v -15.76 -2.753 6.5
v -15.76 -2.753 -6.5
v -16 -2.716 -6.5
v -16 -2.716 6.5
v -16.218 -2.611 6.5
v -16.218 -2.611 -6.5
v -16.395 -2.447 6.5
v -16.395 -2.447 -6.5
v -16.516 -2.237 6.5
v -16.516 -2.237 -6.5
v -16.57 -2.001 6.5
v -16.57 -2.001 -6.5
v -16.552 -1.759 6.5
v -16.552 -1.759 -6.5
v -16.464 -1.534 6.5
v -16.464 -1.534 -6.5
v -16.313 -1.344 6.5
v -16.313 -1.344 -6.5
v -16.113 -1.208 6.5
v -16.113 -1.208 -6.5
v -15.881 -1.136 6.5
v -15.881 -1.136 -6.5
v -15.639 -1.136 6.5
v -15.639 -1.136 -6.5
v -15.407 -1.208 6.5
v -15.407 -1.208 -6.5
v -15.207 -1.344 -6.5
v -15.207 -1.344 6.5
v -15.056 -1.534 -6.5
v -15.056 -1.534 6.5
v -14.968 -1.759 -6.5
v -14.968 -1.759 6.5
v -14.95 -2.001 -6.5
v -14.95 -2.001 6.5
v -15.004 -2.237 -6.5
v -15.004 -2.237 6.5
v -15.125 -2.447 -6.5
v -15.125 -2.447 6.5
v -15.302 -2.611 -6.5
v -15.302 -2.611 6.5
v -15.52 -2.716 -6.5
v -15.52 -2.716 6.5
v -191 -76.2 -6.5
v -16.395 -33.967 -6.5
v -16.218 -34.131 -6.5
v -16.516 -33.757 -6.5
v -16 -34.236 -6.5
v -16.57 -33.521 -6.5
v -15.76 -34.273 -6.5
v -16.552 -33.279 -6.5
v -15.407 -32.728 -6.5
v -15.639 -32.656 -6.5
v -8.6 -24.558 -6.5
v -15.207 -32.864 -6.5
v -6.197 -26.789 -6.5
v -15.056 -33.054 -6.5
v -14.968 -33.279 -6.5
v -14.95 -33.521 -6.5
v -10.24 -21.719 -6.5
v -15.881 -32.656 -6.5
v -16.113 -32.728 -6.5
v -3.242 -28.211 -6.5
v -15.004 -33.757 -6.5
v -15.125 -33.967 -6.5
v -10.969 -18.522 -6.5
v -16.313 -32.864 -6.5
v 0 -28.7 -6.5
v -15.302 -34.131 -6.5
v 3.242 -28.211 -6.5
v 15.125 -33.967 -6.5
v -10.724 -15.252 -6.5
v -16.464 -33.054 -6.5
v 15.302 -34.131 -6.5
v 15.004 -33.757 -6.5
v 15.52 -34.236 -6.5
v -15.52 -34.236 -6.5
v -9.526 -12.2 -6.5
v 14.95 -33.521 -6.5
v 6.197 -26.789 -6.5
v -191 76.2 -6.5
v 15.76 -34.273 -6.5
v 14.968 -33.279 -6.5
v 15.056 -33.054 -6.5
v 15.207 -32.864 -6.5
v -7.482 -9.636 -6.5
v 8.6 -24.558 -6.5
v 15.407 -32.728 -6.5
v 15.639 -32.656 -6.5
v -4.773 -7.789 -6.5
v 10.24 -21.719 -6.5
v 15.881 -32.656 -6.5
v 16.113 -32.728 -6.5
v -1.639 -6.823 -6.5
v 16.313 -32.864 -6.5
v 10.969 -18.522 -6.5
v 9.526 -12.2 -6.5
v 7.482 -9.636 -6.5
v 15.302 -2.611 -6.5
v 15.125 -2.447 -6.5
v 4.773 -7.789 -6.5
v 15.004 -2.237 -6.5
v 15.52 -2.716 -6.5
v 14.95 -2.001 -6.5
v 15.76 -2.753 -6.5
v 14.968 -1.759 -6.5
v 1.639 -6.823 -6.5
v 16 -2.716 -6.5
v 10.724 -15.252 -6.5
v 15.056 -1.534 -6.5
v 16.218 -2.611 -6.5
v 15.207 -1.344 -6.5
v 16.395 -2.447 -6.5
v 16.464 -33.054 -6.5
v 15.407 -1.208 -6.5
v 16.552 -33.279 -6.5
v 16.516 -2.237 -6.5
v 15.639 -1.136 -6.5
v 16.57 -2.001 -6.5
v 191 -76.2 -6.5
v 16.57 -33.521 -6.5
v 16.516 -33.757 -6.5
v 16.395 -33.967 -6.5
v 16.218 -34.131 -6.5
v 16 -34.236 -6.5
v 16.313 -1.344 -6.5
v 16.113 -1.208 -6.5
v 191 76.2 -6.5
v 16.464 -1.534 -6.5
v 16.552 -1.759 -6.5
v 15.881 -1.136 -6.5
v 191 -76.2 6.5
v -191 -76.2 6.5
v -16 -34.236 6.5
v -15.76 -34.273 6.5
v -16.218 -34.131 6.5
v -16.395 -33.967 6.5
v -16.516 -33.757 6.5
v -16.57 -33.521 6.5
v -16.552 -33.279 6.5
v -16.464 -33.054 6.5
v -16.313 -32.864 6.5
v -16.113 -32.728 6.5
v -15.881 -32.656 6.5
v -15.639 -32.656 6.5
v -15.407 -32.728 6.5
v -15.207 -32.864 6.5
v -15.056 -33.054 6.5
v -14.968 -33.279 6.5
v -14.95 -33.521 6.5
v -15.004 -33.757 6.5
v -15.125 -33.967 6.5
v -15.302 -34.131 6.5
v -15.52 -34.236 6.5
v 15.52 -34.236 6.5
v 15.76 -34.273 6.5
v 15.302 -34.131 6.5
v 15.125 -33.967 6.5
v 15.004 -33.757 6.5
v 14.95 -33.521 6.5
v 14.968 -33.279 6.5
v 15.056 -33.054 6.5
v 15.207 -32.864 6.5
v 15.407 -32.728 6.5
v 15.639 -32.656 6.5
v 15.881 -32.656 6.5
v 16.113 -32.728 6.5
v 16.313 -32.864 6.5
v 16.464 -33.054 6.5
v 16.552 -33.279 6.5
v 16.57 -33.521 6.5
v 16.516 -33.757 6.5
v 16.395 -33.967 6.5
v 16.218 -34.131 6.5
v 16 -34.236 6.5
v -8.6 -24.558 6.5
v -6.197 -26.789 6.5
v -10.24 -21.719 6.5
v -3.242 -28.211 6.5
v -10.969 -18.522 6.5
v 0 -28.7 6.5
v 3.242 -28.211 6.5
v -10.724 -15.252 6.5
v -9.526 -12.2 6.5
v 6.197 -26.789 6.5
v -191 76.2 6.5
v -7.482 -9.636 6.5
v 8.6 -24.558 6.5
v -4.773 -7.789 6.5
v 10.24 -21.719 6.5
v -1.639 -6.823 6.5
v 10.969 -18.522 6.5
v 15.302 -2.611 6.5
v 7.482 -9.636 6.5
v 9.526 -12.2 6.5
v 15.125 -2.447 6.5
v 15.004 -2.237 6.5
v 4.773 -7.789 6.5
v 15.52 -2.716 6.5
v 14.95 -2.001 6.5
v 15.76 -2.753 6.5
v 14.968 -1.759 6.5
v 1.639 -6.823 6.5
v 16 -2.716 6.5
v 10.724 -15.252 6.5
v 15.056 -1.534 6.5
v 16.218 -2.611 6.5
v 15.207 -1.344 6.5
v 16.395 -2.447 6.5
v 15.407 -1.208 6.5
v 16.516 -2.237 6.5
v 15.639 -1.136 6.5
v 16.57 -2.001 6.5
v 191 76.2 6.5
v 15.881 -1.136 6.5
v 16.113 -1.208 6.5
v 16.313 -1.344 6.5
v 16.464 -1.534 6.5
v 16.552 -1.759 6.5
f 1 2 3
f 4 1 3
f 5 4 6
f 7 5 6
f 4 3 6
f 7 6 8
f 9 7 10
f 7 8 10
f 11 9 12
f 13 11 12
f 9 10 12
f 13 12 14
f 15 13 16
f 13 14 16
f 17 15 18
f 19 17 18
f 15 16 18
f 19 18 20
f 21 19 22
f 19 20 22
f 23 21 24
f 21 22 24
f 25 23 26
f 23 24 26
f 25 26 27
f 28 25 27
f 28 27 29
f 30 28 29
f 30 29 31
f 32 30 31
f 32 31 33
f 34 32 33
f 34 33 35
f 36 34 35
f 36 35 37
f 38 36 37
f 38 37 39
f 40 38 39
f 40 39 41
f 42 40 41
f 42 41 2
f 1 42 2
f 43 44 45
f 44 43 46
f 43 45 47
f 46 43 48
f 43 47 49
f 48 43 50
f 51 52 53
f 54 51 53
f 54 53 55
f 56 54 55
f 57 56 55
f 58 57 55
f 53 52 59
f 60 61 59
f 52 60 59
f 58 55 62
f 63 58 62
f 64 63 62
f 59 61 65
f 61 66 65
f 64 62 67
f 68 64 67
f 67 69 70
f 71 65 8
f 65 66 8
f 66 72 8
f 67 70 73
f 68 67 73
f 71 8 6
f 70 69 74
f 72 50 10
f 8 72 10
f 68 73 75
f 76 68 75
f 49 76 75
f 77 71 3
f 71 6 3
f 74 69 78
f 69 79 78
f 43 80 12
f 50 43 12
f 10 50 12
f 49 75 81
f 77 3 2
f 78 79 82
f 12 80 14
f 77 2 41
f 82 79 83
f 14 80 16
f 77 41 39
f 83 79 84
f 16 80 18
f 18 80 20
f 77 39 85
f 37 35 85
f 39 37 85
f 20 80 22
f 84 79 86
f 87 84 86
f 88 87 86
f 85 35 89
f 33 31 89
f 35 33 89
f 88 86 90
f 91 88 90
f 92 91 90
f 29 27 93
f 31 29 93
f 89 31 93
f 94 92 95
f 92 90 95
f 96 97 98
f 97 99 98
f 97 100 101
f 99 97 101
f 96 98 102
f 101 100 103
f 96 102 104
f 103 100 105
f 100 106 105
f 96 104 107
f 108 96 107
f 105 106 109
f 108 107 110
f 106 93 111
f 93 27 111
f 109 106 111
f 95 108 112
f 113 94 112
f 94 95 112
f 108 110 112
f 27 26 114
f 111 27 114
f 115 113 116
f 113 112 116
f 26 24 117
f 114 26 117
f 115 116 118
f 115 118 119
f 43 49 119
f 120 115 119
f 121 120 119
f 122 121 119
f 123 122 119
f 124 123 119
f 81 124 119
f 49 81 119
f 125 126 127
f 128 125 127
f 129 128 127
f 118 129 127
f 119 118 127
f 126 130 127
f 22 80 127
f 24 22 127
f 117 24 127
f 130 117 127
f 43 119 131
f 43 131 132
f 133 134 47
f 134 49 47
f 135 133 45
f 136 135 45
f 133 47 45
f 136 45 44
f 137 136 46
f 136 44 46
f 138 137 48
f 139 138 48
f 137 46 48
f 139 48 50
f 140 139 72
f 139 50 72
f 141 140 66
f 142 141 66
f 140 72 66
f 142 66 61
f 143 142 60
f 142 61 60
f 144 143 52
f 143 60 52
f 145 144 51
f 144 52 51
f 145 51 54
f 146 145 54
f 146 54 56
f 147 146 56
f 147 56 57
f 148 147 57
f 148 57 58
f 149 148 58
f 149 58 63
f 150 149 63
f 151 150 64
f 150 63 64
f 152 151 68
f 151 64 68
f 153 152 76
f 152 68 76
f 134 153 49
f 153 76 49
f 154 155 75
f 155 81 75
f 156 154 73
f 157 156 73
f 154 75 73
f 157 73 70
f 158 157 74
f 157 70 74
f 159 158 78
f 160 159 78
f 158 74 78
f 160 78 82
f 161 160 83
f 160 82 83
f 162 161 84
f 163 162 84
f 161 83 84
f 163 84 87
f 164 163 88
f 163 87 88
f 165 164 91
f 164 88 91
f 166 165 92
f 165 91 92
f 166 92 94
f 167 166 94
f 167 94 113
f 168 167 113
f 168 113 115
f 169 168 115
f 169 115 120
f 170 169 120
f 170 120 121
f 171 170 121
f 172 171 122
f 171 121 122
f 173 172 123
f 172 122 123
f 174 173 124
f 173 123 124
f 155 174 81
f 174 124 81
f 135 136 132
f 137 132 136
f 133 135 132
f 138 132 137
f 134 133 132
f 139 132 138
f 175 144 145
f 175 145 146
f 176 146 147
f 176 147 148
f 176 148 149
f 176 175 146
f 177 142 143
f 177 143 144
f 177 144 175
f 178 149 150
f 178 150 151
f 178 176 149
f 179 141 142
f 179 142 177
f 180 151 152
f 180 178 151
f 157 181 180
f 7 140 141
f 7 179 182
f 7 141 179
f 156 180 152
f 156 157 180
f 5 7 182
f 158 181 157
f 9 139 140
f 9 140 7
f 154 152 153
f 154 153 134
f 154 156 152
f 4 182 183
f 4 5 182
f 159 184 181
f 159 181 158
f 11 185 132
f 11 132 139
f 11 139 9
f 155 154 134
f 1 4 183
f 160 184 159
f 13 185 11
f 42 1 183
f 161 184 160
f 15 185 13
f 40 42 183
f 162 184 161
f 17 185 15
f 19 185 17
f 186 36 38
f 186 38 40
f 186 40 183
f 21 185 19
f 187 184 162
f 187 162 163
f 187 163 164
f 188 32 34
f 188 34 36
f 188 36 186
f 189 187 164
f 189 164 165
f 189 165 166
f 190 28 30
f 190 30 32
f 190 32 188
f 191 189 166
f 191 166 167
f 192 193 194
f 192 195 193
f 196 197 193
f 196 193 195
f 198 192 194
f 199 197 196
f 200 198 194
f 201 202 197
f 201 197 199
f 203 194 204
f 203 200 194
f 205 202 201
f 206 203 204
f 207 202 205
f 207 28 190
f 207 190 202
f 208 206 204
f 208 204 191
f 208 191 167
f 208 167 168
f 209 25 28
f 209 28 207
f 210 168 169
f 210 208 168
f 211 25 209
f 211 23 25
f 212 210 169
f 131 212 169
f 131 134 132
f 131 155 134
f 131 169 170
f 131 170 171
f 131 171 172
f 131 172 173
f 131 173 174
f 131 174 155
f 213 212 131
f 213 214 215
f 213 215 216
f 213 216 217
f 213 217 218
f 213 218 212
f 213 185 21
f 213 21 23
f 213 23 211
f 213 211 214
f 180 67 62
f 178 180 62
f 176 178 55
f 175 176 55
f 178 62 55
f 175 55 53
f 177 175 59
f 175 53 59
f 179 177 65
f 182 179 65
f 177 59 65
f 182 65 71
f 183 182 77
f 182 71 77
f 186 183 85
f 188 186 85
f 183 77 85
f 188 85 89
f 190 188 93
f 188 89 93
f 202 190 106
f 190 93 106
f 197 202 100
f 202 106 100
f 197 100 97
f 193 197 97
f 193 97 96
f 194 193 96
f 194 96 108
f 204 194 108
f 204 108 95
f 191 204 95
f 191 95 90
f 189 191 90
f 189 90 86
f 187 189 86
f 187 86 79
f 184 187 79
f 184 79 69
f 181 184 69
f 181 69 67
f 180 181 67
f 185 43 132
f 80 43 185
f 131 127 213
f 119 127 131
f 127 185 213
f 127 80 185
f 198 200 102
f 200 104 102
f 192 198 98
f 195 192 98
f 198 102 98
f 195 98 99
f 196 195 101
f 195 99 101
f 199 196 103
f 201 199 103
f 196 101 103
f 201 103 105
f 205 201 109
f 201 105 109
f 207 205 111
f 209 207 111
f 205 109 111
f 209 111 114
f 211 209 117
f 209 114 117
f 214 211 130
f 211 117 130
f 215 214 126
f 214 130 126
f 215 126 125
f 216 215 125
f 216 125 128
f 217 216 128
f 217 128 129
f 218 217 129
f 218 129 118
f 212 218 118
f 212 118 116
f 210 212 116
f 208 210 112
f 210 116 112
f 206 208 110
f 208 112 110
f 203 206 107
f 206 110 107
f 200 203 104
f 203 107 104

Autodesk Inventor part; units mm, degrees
ref_plane "YZ Plane" through (0, 0, 0) normal (1, 0, 0) x (0, 1, 0)
ref_plane "XZ Plane" through (0, 0, 0) normal (0, 1, 0) x (-1, 0, 0)
ref_plane "XY Plane" through (0, 0, 0) normal (0, 0, 1) x (1, 0, 0)
sketch "Sketch1" plane through (0, 0, 0) normal (0, 0, 1) x (1, 0, 0)
  line L0 (-191, 76.2) -> (191, 76.2)
  line L1 (191, 76.2) -> (191, -76.2)
  line L2 (191, -76.2) -> (-191, -76.2)
  line L3 (-191, -76.2) -> (-191, 76.2)
  line L4 (-191, 76.2) -> (191, -76.2) construction
  line L5 (191, 76.2) -> (-191, -76.2) construction
  point P0 (0, 0)
  dimension "d0" = 152.4
  dimension "d1" = 382
extrude "Extrusion1" add sketch "Sketch1" along normal mid plane 13
sketch "Sketch3" plane through (0, 0, 6.5) normal (0, 0, 1) x (1, 0, 0)
  circle A0 centre (15.76, -1.94) radius 0.8126
  circle A1 centre (-15.76, -1.94) radius 0.8126
  circle A2 centre (15.76, -33.46) radius 0.8126
  circle A3 centre (-15.76, -33.46) radius 0.8126
  line L0 (-15.76, -1.94) -> (15.76, -1.94)
  line L1 (15.76, -1.94) -> (15.76, -33.46)
  line L2 (15.76, -33.46) -> (-15.76, -33.46)
  line L3 (-15.76, -33.46) -> (-15.76, -1.94)
  line L4 (-15.76, -1.94) -> (15.76, -33.46) construction
  line L5 (15.76, -1.94) -> (-15.76, -33.46) construction
  line L6 (-191, -76.2) -> (191, -76.2) projected
  line L7 (-191, 76.2) -> (-191, -76.2) projected
  point P0 (0, 0)
  point P1 (0, -17.7)
  point P2 (0, -17.7)
  dimension "d5" = 31.52
  dimension "d6" = 31.52
  dimension "d7" = 58.5
hole "Hole1" at (15.76, -1.94, 6.5) at (-15.76, -1.94, 6.5) at (-15.76, -33.46, 6.5) at (15.76, -33.46, 6.5) direction (0, 0, -1) diameter 1.6252 end through all
sketch "Sketch4" plane through (0, 0, 6.5) normal (0, 0, 1) x (1, 0, 0)
  circle A0 centre (-15.76, -1.94) radius 0.8126 projected
  circle A1 centre (15.76, -33.46) radius 0.8126 projected
  circle A2 centre (0, -17.7) radius 11
  point P0 (0, 0)
  dimension "d18" = 22
hole "Hole2" at (0, -17.7, 6.5) direction (0, 0, -1) diameter 22 end through all
properties part number "CNC-X-axis- foundation faces"
